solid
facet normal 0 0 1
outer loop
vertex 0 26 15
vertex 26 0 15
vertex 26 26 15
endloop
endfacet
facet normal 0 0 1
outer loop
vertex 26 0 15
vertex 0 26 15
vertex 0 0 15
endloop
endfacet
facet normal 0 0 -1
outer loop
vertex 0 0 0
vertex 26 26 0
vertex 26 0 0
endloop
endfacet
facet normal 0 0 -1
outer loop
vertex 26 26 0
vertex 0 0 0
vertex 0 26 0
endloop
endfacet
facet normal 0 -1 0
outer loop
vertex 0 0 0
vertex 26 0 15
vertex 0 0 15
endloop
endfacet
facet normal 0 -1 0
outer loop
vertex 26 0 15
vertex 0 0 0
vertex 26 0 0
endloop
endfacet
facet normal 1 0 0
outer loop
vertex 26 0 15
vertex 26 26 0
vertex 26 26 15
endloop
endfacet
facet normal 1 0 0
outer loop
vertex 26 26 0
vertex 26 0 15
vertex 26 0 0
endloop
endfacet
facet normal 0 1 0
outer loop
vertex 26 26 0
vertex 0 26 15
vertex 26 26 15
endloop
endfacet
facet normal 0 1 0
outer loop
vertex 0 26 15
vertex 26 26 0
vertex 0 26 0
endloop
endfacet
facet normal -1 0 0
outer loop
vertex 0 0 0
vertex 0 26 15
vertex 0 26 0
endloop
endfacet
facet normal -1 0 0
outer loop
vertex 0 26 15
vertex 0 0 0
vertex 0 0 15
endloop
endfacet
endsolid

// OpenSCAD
// Copyright 2015 Arthur Davis (thingiverse.com/artdavis)
// This file is licensed under a Creative Commons Attribution 4.0
// International License.
// THE SOFTWARE IS PROVIDED "AS IS", WITHOUT WARRANTY OF ANY KIND, EXPRESS OR
// IMPLIED, INCLUDING BUT NOT LIMITED TO THE WARRANTIES OF MERCHANTABILITY,
// FITNESS FOR A PARTICULAR PURPOSE AND NONINFRINGEMENT. IN NO EVENT SHALL THE
// AUTHORS OR COPYRIGHT HOLDERS BE LIABLE FOR ANY CLAIM, DAMAGES OR OTHER
// LIABILITY, WHETHER IN AN ACTION OF CONTRACT, TORT OR OTHERWISE, ARISING
// FROM, OUT OF OR IN CONNECTION WITH THE SOFTWARE OR THE USE OR OTHER
// DEALINGS IN THE SOFTWARE.

// Embossing Emblem stamp.
// Uploaded image should be high contrast and 150px x 150px.
// The black values will be low points and the white values will
// be ridges.
// Units are in mm

/* [Global] */
// Grayscale image. Black values are low points and white is high.
image_file = "emboss-surface.dat"; // [image_surface:150x150]
// Stamp width
part_width = 26.0; // [12.0:1.0:50.0]
// Stamp height
part_height = 26.0; // [12.0:1.0:50.0]
// Embossing ridge thickness
ridge_thick = 3.0; // [1.0:1.0:10.0]
// Length of the punch body
punch_length = 15.0; // [5.0:1.0:50.0]

/* [Hidden] */
// Special variables for arc generation:
$fa = 0.1; // minimum fragment angle
$fs = 0.2; // minimum fragment size
//  Logo image width
image_width = 150; // [50:1:150]
// Logo image height
image_height = 150; // [50:1:150]

translate(v = [0, 0, punch_length])
//scale(v = [width / image_width, height / image_height, ridge_thick / 255])
scale(v = [part_width / image_width, part_height / image_height, ridge_thick])
surface(file=image_file);

cube(size = [part_width, part_height, punch_length]);
